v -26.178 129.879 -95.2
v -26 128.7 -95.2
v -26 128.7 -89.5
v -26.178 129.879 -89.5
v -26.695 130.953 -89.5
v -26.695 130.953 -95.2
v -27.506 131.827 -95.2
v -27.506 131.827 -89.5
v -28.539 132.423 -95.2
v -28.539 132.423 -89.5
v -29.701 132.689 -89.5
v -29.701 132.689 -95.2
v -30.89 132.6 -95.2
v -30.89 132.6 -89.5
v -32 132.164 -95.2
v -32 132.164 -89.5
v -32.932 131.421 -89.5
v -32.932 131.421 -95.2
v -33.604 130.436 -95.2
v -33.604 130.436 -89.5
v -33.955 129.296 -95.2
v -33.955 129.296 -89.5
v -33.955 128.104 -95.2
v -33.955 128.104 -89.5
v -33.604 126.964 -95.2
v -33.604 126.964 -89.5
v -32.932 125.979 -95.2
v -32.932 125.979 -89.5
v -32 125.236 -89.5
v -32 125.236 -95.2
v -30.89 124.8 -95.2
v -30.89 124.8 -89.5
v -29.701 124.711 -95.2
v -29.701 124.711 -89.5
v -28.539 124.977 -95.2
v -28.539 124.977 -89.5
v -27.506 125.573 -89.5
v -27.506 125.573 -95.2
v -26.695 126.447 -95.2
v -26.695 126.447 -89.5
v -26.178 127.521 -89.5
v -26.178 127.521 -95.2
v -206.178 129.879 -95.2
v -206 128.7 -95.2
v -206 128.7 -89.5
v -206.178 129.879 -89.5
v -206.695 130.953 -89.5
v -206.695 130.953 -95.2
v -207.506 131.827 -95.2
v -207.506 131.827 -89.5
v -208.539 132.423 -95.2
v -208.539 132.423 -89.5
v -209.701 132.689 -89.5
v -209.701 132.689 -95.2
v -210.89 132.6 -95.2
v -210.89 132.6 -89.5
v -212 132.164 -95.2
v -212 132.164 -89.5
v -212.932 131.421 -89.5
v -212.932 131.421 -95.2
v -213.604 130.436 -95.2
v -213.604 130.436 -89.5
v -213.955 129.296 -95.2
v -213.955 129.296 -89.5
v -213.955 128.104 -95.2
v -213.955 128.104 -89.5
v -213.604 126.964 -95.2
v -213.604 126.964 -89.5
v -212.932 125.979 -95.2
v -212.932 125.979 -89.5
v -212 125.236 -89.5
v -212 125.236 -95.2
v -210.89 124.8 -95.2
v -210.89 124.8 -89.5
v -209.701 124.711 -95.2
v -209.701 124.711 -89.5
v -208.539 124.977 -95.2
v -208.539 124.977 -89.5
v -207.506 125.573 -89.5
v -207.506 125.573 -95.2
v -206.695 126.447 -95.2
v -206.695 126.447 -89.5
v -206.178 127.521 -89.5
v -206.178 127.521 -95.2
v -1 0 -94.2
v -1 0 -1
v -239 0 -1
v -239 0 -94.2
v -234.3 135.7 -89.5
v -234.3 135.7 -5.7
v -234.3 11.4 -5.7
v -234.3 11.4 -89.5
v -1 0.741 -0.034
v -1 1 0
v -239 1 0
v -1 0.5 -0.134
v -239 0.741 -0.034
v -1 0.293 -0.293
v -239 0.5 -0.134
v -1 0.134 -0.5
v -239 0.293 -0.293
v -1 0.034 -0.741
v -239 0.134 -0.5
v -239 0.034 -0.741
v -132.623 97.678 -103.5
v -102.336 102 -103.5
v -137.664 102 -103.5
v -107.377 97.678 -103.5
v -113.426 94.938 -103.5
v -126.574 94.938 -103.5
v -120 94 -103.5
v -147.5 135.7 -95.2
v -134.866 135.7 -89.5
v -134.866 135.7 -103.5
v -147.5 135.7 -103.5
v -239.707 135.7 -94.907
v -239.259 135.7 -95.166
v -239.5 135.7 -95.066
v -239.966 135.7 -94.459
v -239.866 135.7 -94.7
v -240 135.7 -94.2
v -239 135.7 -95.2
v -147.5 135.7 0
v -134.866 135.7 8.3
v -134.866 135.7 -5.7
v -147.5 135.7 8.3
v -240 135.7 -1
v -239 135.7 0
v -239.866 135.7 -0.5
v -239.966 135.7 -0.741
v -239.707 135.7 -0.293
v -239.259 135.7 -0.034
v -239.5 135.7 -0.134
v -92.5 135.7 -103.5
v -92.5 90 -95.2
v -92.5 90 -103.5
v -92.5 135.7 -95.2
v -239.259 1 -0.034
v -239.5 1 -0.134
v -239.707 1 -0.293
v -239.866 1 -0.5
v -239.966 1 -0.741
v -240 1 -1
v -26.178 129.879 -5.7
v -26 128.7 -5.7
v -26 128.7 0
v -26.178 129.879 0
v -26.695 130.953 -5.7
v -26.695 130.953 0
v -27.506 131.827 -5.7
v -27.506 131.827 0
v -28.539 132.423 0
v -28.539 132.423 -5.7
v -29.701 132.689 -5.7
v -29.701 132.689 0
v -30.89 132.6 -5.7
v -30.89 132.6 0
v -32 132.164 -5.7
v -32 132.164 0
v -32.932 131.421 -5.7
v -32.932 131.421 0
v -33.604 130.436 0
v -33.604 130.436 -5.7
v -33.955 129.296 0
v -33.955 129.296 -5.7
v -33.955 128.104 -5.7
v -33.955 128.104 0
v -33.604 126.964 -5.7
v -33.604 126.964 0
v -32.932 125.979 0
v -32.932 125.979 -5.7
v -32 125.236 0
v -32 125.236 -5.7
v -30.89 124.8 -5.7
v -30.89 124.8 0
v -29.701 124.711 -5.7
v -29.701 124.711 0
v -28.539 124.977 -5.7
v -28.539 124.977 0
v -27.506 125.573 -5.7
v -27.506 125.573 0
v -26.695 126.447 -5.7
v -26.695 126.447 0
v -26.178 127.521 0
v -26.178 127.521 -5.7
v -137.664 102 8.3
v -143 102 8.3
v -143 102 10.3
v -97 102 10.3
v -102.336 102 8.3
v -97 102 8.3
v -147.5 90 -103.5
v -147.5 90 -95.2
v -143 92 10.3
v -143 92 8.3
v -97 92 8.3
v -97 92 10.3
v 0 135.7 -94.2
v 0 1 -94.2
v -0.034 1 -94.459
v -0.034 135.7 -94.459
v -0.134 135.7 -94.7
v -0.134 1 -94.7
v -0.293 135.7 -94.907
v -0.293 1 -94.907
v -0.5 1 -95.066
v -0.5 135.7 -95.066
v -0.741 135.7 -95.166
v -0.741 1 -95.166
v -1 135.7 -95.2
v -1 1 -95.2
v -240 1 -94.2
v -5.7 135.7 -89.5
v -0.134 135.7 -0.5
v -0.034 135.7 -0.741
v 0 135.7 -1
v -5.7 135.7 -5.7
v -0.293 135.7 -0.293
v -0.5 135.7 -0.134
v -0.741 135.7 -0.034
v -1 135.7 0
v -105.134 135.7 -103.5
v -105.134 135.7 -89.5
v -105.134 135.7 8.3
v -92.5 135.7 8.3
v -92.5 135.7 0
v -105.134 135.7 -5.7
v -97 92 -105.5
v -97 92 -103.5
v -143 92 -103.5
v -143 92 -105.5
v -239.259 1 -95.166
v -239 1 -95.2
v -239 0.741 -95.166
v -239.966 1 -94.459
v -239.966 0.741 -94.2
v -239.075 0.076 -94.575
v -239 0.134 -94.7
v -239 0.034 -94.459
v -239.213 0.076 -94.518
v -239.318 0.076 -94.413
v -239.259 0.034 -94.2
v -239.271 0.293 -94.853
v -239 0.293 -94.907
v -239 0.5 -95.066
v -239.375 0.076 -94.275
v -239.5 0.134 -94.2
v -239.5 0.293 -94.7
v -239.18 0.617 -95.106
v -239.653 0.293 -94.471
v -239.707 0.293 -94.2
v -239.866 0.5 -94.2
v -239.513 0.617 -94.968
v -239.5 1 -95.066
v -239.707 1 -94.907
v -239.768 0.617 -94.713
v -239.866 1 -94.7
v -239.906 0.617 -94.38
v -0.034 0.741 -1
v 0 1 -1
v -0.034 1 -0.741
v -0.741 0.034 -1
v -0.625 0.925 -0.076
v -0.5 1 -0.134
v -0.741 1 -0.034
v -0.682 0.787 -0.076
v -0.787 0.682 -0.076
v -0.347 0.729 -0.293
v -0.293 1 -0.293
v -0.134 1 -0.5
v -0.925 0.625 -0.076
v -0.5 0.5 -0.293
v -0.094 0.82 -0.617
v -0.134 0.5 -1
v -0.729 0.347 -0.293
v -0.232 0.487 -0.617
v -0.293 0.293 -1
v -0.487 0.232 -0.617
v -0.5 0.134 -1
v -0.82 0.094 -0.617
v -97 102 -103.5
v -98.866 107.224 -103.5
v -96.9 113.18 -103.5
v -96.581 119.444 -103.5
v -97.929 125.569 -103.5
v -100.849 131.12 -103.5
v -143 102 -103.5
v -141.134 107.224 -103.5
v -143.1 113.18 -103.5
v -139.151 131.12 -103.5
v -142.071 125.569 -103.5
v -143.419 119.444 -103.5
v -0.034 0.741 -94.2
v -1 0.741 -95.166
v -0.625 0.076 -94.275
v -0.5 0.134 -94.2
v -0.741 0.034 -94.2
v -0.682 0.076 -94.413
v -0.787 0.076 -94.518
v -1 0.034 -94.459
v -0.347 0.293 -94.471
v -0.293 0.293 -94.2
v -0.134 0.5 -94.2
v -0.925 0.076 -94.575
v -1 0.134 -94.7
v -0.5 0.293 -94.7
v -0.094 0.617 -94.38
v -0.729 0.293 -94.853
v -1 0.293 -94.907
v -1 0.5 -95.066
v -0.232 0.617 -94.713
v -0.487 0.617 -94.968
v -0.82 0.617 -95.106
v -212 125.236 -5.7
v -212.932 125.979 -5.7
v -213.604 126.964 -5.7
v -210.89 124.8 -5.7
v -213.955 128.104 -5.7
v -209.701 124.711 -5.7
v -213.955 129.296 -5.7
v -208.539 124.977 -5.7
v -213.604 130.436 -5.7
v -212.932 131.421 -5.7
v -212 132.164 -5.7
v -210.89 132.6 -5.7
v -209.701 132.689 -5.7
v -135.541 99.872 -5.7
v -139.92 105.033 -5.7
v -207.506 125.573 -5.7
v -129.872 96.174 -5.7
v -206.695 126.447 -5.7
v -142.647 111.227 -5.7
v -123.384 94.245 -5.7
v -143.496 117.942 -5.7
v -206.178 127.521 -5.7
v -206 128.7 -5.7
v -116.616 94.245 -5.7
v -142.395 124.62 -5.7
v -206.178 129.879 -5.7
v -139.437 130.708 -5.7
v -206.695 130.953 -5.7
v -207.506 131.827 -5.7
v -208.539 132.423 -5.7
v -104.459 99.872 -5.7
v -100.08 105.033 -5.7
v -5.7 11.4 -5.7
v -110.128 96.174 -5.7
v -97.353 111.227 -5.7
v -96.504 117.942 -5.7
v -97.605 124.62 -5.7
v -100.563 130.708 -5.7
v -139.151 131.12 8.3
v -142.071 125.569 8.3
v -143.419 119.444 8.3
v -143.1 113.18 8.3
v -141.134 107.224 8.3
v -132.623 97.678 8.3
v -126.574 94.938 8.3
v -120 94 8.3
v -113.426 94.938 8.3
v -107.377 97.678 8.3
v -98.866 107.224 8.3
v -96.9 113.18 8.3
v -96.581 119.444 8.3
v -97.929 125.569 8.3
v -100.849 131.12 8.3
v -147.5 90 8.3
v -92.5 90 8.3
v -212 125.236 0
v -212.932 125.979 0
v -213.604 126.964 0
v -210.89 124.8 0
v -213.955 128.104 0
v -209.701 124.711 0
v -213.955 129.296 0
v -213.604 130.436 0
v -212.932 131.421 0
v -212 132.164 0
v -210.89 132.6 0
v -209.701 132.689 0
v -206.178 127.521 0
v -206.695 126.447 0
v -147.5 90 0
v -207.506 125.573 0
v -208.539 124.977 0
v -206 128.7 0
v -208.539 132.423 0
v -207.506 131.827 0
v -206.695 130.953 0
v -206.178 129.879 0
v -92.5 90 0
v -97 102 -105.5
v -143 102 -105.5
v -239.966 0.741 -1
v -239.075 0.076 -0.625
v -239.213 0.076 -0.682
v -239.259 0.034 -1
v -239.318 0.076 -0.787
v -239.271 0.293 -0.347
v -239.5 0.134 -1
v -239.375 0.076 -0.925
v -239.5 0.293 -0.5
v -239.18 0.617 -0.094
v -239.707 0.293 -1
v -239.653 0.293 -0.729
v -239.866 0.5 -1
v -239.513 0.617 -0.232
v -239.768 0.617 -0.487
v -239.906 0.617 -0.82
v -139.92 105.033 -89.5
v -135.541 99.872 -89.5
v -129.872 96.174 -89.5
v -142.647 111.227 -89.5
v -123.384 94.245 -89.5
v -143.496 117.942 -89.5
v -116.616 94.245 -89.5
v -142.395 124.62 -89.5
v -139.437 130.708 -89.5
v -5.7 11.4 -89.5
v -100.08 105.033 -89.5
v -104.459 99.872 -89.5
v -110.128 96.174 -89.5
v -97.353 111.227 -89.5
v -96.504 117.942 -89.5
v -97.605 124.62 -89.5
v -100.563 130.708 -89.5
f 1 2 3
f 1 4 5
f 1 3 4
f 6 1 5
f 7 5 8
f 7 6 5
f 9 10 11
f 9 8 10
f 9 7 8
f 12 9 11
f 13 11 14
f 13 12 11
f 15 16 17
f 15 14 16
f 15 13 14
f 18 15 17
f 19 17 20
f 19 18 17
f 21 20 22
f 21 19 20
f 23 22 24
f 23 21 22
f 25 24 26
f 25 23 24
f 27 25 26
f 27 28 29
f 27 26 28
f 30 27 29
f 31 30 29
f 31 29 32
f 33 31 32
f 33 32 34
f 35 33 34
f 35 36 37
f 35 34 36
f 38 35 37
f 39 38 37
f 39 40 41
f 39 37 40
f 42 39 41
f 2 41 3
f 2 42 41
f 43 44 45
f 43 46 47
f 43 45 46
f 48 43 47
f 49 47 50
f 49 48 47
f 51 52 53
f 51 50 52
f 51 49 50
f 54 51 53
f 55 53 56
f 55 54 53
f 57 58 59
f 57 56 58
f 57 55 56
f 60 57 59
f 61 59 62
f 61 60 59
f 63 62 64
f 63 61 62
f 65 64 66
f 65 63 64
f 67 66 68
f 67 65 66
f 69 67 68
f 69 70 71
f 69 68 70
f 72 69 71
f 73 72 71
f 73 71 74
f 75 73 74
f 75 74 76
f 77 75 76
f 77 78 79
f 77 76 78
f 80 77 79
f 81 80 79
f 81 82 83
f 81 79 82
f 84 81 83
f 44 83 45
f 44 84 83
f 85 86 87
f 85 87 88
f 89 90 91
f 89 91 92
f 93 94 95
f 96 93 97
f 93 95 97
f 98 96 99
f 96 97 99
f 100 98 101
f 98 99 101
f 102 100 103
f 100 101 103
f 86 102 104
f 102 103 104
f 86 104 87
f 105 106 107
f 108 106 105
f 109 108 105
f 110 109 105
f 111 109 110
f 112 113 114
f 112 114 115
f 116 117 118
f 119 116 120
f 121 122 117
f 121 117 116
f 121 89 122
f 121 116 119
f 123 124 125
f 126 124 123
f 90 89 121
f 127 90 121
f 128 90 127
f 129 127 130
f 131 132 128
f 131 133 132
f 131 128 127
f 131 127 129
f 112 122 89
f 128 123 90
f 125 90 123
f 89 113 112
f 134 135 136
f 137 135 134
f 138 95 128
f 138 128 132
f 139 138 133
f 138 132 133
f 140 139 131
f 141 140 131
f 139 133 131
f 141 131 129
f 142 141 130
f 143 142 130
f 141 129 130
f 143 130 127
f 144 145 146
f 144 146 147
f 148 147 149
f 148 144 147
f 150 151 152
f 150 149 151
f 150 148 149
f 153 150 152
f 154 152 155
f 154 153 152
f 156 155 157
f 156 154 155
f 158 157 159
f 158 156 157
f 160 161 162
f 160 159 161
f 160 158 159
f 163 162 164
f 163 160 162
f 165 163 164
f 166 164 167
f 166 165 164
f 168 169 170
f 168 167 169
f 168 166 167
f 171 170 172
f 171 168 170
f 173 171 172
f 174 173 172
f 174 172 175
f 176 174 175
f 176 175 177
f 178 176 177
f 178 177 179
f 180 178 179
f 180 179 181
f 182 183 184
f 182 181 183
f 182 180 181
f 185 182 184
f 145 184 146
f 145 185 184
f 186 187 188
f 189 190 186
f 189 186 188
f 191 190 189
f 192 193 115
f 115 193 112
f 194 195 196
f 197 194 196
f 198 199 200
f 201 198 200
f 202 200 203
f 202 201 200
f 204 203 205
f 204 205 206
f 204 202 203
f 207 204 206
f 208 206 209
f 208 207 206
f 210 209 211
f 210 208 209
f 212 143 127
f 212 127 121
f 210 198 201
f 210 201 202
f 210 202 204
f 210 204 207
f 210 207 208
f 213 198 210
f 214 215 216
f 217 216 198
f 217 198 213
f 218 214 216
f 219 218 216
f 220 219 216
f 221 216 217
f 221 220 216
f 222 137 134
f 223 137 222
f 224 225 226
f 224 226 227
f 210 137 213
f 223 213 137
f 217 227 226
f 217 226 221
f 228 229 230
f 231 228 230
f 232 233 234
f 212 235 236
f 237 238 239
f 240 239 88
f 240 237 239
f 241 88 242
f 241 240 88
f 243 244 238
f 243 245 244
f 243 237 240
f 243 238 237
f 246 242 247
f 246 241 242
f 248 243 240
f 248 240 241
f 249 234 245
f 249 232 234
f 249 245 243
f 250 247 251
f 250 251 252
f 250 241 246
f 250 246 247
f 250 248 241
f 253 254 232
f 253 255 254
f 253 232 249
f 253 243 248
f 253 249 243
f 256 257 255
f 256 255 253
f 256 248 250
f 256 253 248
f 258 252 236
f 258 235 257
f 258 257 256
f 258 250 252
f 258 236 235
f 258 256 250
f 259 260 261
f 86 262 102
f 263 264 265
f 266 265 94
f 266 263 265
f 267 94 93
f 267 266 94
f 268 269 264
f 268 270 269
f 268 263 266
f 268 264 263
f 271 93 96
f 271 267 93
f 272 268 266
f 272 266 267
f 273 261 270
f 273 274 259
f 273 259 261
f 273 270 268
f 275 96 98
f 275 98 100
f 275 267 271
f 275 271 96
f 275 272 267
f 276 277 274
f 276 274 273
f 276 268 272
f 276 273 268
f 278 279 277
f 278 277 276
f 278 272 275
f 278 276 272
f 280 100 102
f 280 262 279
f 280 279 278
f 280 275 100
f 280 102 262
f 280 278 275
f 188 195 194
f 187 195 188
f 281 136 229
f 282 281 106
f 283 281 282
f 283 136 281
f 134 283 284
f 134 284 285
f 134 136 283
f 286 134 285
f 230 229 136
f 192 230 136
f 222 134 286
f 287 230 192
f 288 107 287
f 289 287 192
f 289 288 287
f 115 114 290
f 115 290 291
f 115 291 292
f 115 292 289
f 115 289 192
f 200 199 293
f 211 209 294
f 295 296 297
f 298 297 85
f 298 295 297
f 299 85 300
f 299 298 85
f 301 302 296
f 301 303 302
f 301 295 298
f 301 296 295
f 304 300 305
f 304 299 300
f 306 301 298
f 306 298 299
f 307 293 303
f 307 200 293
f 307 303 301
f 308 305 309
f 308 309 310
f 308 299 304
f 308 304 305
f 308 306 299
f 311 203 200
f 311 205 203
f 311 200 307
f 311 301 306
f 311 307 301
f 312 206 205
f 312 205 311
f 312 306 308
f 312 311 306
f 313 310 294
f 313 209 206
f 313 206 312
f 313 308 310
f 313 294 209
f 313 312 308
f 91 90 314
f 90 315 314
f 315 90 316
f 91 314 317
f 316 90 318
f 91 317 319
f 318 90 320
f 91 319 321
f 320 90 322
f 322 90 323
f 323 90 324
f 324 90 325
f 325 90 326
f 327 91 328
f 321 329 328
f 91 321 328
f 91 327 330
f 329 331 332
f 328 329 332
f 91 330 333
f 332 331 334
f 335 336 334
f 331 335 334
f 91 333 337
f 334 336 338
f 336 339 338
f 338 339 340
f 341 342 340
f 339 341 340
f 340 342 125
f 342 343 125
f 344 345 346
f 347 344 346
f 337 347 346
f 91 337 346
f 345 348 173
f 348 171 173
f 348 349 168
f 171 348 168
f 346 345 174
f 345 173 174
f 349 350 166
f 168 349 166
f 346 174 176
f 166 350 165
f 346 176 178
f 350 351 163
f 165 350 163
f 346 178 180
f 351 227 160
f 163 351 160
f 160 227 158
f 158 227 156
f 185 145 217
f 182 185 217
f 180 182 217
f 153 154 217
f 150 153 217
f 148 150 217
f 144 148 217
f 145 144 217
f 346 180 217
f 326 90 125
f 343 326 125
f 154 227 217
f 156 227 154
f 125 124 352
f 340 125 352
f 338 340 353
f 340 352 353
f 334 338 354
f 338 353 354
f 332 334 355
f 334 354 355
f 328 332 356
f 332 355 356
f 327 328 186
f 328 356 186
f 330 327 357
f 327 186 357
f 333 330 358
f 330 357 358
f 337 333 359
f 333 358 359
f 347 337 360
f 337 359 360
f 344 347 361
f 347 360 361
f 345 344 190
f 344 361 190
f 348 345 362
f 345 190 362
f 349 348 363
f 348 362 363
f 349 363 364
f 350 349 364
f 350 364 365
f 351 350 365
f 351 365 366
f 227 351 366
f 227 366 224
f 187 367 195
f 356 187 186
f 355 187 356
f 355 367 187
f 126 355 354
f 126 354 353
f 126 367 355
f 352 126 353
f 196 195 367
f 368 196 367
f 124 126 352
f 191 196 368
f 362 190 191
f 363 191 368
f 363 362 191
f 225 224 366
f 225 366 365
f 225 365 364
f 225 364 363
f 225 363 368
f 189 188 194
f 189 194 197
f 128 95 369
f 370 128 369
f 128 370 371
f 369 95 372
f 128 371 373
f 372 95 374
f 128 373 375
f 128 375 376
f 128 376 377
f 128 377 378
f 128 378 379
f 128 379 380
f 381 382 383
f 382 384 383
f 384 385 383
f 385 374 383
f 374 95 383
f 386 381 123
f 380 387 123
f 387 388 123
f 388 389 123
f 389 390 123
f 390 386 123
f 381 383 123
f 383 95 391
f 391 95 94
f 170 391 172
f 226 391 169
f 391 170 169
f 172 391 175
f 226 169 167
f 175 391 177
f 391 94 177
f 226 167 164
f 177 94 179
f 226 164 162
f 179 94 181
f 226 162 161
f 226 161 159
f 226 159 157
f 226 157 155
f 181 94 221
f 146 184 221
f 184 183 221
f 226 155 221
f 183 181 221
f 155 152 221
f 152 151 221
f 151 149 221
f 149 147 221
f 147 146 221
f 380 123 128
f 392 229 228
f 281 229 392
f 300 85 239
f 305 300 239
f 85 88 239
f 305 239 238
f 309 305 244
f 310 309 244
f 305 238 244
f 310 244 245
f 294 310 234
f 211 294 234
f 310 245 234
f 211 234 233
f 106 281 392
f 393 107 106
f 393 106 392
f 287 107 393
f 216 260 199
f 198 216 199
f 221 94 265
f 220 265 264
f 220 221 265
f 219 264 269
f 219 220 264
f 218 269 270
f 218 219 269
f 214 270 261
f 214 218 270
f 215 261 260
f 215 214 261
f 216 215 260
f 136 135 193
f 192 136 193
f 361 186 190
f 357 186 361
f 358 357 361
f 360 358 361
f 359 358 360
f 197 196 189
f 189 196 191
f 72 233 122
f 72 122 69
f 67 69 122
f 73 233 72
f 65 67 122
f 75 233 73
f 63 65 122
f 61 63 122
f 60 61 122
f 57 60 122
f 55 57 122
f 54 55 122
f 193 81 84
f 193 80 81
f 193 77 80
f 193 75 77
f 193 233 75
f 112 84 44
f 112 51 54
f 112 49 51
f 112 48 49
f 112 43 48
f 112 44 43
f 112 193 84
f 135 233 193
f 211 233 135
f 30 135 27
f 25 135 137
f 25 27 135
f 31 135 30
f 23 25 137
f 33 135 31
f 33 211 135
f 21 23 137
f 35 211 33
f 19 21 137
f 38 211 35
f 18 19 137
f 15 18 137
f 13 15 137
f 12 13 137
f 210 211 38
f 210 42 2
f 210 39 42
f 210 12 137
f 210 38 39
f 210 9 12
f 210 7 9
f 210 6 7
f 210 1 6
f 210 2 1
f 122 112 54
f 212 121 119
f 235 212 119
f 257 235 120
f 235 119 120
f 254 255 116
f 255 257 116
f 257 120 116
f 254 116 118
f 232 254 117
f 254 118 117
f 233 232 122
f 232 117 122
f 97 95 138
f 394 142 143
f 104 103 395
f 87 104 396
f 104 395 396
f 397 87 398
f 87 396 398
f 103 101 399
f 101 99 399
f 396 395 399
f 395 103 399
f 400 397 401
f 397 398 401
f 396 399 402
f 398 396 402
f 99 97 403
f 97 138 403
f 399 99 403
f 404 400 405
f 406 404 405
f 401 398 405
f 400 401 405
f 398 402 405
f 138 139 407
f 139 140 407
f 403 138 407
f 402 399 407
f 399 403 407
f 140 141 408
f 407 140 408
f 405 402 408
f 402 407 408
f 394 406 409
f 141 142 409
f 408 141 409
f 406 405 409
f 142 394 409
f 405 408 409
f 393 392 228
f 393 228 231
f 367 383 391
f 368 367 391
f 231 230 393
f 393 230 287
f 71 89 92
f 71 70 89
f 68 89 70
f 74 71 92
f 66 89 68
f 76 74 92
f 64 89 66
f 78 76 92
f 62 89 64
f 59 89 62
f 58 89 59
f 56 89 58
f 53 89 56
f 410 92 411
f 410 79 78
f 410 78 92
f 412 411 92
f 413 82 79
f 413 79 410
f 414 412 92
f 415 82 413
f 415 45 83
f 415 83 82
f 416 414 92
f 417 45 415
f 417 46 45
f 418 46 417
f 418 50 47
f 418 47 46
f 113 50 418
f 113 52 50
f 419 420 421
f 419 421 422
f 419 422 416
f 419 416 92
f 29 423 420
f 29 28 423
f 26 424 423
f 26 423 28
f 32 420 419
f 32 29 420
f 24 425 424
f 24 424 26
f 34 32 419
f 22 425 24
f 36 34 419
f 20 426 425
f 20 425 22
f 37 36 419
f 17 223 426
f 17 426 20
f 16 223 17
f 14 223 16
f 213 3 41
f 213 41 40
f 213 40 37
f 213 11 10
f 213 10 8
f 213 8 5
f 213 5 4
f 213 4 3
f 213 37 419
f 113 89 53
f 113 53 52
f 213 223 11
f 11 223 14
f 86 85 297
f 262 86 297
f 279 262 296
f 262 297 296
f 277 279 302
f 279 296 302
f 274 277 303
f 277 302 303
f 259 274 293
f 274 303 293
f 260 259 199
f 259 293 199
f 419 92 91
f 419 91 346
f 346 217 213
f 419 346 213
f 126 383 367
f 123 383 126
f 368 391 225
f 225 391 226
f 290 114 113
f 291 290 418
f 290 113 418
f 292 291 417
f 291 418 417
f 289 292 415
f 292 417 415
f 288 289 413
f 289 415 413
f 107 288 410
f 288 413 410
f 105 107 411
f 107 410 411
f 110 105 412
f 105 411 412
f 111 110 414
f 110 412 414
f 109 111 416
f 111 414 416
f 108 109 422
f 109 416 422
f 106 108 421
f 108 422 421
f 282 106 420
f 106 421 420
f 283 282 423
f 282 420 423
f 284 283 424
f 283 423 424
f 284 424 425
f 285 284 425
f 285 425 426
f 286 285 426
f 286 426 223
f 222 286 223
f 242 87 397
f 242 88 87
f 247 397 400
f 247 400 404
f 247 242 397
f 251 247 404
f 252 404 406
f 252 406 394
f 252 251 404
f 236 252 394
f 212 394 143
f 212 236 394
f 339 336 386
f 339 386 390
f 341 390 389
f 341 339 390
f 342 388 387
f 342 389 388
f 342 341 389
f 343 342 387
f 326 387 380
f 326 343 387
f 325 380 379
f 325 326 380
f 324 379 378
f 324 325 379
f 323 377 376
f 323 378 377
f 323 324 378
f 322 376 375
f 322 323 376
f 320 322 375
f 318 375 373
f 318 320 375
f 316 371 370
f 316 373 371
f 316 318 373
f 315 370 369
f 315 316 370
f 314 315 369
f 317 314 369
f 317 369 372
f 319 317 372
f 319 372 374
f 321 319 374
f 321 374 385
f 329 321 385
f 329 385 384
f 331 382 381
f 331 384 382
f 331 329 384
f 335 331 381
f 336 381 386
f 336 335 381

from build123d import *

# Parameters (mm, degrees)
SKETCH1_W               = 95.2
SKETCH1_H               = 135.7
BOSS_EXTRUDE1_DEPTH     = 240
SKETCH3_W               = 228.6
SKETCH3_H               = 83.8
CUT_EXTRUDE1_DEPTH      = 124.3
FILLET1_R               = 1
SKETCH6_R               = 23.5
CUT_EXTRUDE2_DEPTH      = 140
SKETCH7_W               = 55
SKETCH7_H               = 45.7
BOSS_EXTRUDE2_DEPTH     = 8.3
SKETCH8_R               = 23.5
CUT_EXTRUDE3_DEPTH      = 295.494040687
SKETCH9_W               = 55
SKETCH9_H               = 45.7
BOSS_EXTRUDE3_DEPTH     = 8.3
SKETCH10_R              = 23.5
CUT_EXTRUDE4_DEPTH      = 298.512571163
CUT_EXTRUDE5_DEPTH      = 295.494040687
CUT_EXTRUDE5_DEPTH_BACK = 295.494040687
SKETCH11_R              = 4
SKETCH12_W              = 46
SKETCH12_H              = 10
BOSS_EXTRUDE4_DEPTH     = 2
SKETCH13_W              = 46
SKETCH13_H              = 10
BOSS_EXTRUDE5_DEPTH     = 2


with BuildPart() as part:
    # Sketch1 → Boss-Extrude1 (new body)
    with BuildSketch(Plane(origin=(0, 0, 0), x_dir=(0, 0, -1), z_dir=(1, 0, 0))):
        with Locations((47.6, 67.85)):
            Rectangle(SKETCH1_W, SKETCH1_H)
    extrude(amount=-BOSS_EXTRUDE1_DEPTH)

    # Sketch3 → Cut-Extrude1 (cut)
    with BuildSketch(Plane(origin=(0, 135.7, 0), x_dir=(1, 0, 0), z_dir=(0, 1, 0))):
        with Locations((-120, 47.6)):
            Rectangle(SKETCH3_W, SKETCH3_H)
    extrude(amount=-CUT_EXTRUDE1_DEPTH, mode=Mode.SUBTRACT)

    # Fillet1
    fillet1_edges = [part.edges().sort_by_distance(p)[0] for p in [
        (-240, 67.85, -95.2),
        (-240, 67.85, 0),
        (0, 67.85, -95.2),
        (0, 0, -47.6),
        (0, 67.85, 0),
        (-120, 0, -95.2),
        (-120, 0, 0),
        (-240, 0, -47.6),
    ]]
    fillet(fillet1_edges, radius=FILLET1_R)

    # Sketch6 → Cut-Extrude2 (cut)
    with BuildSketch(Plane.XY):
        with Locations((-120, 117.5)):
            Circle(SKETCH6_R)
    extrude(amount=-CUT_EXTRUDE2_DEPTH, mode=Mode.SUBTRACT)

    # Sketch7 → Boss-Extrude2 (add)
    with BuildSketch(Plane.XY):
        with Locations((-120, 112.85)):
            Rectangle(SKETCH7_W, SKETCH7_H)
    extrude(amount=BOSS_EXTRUDE2_DEPTH)

    # Sketch8 → Cut-Extrude3 (cut, through all)
    with BuildSketch(Plane(origin=(0, 0, -95.2), x_dir=(-1, 0, 0), z_dir=(0, 0, -1))):
        with Locations((120, 117.5)):
            Circle(SKETCH8_R)
    extrude(amount=-CUT_EXTRUDE3_DEPTH, mode=Mode.SUBTRACT)

    # Sketch9 → Boss-Extrude3 (add)
    with BuildSketch(Plane(origin=(0, 0, -95.2), x_dir=(-1, 0, 0), z_dir=(0, 0, -1))):
        with Locations((120, 112.85)):
            Rectangle(SKETCH9_W, SKETCH9_H)
    extrude(amount=BOSS_EXTRUDE3_DEPTH)

    # Sketch10 → Cut-Extrude4 (cut, through all)
    with BuildSketch(Plane.XY.offset(8.3)):
        with Locations((-120, 117.5)):
            Circle(SKETCH10_R)
    extrude(amount=-CUT_EXTRUDE4_DEPTH, mode=Mode.SUBTRACT)

    # Sketch11 → Cut-Extrude5 (cut, two sides: drawn at the far end of the back side and taken through both)
    with BuildSketch(Plane.XY.offset(-CUT_EXTRUDE5_DEPTH_BACK)):
        with Locations((-30, 128.7)):
            Circle(SKETCH11_R)
        with Locations((-210, 128.7)):
            Circle(SKETCH11_R)
    extrude(amount=CUT_EXTRUDE5_DEPTH + CUT_EXTRUDE5_DEPTH_BACK, mode=Mode.SUBTRACT)

    # Sketch12 → Boss-Extrude4 (add)
    with BuildSketch(Plane.XY.offset(8.3)):
        with Locations((-120, 97)):
            Rectangle(SKETCH12_W, SKETCH12_H)
    extrude(amount=BOSS_EXTRUDE4_DEPTH)

    # Sketch13 → Boss-Extrude5 (add)
    with BuildSketch(Plane(origin=(0, 0, -103.5), x_dir=(-1, 0, 0), z_dir=(0, 0, -1))):
        with Locations((120, 97)):
            Rectangle(SKETCH13_W, SKETCH13_H)
    extrude(amount=BOSS_EXTRUDE5_DEPTH)


solid = part.part
